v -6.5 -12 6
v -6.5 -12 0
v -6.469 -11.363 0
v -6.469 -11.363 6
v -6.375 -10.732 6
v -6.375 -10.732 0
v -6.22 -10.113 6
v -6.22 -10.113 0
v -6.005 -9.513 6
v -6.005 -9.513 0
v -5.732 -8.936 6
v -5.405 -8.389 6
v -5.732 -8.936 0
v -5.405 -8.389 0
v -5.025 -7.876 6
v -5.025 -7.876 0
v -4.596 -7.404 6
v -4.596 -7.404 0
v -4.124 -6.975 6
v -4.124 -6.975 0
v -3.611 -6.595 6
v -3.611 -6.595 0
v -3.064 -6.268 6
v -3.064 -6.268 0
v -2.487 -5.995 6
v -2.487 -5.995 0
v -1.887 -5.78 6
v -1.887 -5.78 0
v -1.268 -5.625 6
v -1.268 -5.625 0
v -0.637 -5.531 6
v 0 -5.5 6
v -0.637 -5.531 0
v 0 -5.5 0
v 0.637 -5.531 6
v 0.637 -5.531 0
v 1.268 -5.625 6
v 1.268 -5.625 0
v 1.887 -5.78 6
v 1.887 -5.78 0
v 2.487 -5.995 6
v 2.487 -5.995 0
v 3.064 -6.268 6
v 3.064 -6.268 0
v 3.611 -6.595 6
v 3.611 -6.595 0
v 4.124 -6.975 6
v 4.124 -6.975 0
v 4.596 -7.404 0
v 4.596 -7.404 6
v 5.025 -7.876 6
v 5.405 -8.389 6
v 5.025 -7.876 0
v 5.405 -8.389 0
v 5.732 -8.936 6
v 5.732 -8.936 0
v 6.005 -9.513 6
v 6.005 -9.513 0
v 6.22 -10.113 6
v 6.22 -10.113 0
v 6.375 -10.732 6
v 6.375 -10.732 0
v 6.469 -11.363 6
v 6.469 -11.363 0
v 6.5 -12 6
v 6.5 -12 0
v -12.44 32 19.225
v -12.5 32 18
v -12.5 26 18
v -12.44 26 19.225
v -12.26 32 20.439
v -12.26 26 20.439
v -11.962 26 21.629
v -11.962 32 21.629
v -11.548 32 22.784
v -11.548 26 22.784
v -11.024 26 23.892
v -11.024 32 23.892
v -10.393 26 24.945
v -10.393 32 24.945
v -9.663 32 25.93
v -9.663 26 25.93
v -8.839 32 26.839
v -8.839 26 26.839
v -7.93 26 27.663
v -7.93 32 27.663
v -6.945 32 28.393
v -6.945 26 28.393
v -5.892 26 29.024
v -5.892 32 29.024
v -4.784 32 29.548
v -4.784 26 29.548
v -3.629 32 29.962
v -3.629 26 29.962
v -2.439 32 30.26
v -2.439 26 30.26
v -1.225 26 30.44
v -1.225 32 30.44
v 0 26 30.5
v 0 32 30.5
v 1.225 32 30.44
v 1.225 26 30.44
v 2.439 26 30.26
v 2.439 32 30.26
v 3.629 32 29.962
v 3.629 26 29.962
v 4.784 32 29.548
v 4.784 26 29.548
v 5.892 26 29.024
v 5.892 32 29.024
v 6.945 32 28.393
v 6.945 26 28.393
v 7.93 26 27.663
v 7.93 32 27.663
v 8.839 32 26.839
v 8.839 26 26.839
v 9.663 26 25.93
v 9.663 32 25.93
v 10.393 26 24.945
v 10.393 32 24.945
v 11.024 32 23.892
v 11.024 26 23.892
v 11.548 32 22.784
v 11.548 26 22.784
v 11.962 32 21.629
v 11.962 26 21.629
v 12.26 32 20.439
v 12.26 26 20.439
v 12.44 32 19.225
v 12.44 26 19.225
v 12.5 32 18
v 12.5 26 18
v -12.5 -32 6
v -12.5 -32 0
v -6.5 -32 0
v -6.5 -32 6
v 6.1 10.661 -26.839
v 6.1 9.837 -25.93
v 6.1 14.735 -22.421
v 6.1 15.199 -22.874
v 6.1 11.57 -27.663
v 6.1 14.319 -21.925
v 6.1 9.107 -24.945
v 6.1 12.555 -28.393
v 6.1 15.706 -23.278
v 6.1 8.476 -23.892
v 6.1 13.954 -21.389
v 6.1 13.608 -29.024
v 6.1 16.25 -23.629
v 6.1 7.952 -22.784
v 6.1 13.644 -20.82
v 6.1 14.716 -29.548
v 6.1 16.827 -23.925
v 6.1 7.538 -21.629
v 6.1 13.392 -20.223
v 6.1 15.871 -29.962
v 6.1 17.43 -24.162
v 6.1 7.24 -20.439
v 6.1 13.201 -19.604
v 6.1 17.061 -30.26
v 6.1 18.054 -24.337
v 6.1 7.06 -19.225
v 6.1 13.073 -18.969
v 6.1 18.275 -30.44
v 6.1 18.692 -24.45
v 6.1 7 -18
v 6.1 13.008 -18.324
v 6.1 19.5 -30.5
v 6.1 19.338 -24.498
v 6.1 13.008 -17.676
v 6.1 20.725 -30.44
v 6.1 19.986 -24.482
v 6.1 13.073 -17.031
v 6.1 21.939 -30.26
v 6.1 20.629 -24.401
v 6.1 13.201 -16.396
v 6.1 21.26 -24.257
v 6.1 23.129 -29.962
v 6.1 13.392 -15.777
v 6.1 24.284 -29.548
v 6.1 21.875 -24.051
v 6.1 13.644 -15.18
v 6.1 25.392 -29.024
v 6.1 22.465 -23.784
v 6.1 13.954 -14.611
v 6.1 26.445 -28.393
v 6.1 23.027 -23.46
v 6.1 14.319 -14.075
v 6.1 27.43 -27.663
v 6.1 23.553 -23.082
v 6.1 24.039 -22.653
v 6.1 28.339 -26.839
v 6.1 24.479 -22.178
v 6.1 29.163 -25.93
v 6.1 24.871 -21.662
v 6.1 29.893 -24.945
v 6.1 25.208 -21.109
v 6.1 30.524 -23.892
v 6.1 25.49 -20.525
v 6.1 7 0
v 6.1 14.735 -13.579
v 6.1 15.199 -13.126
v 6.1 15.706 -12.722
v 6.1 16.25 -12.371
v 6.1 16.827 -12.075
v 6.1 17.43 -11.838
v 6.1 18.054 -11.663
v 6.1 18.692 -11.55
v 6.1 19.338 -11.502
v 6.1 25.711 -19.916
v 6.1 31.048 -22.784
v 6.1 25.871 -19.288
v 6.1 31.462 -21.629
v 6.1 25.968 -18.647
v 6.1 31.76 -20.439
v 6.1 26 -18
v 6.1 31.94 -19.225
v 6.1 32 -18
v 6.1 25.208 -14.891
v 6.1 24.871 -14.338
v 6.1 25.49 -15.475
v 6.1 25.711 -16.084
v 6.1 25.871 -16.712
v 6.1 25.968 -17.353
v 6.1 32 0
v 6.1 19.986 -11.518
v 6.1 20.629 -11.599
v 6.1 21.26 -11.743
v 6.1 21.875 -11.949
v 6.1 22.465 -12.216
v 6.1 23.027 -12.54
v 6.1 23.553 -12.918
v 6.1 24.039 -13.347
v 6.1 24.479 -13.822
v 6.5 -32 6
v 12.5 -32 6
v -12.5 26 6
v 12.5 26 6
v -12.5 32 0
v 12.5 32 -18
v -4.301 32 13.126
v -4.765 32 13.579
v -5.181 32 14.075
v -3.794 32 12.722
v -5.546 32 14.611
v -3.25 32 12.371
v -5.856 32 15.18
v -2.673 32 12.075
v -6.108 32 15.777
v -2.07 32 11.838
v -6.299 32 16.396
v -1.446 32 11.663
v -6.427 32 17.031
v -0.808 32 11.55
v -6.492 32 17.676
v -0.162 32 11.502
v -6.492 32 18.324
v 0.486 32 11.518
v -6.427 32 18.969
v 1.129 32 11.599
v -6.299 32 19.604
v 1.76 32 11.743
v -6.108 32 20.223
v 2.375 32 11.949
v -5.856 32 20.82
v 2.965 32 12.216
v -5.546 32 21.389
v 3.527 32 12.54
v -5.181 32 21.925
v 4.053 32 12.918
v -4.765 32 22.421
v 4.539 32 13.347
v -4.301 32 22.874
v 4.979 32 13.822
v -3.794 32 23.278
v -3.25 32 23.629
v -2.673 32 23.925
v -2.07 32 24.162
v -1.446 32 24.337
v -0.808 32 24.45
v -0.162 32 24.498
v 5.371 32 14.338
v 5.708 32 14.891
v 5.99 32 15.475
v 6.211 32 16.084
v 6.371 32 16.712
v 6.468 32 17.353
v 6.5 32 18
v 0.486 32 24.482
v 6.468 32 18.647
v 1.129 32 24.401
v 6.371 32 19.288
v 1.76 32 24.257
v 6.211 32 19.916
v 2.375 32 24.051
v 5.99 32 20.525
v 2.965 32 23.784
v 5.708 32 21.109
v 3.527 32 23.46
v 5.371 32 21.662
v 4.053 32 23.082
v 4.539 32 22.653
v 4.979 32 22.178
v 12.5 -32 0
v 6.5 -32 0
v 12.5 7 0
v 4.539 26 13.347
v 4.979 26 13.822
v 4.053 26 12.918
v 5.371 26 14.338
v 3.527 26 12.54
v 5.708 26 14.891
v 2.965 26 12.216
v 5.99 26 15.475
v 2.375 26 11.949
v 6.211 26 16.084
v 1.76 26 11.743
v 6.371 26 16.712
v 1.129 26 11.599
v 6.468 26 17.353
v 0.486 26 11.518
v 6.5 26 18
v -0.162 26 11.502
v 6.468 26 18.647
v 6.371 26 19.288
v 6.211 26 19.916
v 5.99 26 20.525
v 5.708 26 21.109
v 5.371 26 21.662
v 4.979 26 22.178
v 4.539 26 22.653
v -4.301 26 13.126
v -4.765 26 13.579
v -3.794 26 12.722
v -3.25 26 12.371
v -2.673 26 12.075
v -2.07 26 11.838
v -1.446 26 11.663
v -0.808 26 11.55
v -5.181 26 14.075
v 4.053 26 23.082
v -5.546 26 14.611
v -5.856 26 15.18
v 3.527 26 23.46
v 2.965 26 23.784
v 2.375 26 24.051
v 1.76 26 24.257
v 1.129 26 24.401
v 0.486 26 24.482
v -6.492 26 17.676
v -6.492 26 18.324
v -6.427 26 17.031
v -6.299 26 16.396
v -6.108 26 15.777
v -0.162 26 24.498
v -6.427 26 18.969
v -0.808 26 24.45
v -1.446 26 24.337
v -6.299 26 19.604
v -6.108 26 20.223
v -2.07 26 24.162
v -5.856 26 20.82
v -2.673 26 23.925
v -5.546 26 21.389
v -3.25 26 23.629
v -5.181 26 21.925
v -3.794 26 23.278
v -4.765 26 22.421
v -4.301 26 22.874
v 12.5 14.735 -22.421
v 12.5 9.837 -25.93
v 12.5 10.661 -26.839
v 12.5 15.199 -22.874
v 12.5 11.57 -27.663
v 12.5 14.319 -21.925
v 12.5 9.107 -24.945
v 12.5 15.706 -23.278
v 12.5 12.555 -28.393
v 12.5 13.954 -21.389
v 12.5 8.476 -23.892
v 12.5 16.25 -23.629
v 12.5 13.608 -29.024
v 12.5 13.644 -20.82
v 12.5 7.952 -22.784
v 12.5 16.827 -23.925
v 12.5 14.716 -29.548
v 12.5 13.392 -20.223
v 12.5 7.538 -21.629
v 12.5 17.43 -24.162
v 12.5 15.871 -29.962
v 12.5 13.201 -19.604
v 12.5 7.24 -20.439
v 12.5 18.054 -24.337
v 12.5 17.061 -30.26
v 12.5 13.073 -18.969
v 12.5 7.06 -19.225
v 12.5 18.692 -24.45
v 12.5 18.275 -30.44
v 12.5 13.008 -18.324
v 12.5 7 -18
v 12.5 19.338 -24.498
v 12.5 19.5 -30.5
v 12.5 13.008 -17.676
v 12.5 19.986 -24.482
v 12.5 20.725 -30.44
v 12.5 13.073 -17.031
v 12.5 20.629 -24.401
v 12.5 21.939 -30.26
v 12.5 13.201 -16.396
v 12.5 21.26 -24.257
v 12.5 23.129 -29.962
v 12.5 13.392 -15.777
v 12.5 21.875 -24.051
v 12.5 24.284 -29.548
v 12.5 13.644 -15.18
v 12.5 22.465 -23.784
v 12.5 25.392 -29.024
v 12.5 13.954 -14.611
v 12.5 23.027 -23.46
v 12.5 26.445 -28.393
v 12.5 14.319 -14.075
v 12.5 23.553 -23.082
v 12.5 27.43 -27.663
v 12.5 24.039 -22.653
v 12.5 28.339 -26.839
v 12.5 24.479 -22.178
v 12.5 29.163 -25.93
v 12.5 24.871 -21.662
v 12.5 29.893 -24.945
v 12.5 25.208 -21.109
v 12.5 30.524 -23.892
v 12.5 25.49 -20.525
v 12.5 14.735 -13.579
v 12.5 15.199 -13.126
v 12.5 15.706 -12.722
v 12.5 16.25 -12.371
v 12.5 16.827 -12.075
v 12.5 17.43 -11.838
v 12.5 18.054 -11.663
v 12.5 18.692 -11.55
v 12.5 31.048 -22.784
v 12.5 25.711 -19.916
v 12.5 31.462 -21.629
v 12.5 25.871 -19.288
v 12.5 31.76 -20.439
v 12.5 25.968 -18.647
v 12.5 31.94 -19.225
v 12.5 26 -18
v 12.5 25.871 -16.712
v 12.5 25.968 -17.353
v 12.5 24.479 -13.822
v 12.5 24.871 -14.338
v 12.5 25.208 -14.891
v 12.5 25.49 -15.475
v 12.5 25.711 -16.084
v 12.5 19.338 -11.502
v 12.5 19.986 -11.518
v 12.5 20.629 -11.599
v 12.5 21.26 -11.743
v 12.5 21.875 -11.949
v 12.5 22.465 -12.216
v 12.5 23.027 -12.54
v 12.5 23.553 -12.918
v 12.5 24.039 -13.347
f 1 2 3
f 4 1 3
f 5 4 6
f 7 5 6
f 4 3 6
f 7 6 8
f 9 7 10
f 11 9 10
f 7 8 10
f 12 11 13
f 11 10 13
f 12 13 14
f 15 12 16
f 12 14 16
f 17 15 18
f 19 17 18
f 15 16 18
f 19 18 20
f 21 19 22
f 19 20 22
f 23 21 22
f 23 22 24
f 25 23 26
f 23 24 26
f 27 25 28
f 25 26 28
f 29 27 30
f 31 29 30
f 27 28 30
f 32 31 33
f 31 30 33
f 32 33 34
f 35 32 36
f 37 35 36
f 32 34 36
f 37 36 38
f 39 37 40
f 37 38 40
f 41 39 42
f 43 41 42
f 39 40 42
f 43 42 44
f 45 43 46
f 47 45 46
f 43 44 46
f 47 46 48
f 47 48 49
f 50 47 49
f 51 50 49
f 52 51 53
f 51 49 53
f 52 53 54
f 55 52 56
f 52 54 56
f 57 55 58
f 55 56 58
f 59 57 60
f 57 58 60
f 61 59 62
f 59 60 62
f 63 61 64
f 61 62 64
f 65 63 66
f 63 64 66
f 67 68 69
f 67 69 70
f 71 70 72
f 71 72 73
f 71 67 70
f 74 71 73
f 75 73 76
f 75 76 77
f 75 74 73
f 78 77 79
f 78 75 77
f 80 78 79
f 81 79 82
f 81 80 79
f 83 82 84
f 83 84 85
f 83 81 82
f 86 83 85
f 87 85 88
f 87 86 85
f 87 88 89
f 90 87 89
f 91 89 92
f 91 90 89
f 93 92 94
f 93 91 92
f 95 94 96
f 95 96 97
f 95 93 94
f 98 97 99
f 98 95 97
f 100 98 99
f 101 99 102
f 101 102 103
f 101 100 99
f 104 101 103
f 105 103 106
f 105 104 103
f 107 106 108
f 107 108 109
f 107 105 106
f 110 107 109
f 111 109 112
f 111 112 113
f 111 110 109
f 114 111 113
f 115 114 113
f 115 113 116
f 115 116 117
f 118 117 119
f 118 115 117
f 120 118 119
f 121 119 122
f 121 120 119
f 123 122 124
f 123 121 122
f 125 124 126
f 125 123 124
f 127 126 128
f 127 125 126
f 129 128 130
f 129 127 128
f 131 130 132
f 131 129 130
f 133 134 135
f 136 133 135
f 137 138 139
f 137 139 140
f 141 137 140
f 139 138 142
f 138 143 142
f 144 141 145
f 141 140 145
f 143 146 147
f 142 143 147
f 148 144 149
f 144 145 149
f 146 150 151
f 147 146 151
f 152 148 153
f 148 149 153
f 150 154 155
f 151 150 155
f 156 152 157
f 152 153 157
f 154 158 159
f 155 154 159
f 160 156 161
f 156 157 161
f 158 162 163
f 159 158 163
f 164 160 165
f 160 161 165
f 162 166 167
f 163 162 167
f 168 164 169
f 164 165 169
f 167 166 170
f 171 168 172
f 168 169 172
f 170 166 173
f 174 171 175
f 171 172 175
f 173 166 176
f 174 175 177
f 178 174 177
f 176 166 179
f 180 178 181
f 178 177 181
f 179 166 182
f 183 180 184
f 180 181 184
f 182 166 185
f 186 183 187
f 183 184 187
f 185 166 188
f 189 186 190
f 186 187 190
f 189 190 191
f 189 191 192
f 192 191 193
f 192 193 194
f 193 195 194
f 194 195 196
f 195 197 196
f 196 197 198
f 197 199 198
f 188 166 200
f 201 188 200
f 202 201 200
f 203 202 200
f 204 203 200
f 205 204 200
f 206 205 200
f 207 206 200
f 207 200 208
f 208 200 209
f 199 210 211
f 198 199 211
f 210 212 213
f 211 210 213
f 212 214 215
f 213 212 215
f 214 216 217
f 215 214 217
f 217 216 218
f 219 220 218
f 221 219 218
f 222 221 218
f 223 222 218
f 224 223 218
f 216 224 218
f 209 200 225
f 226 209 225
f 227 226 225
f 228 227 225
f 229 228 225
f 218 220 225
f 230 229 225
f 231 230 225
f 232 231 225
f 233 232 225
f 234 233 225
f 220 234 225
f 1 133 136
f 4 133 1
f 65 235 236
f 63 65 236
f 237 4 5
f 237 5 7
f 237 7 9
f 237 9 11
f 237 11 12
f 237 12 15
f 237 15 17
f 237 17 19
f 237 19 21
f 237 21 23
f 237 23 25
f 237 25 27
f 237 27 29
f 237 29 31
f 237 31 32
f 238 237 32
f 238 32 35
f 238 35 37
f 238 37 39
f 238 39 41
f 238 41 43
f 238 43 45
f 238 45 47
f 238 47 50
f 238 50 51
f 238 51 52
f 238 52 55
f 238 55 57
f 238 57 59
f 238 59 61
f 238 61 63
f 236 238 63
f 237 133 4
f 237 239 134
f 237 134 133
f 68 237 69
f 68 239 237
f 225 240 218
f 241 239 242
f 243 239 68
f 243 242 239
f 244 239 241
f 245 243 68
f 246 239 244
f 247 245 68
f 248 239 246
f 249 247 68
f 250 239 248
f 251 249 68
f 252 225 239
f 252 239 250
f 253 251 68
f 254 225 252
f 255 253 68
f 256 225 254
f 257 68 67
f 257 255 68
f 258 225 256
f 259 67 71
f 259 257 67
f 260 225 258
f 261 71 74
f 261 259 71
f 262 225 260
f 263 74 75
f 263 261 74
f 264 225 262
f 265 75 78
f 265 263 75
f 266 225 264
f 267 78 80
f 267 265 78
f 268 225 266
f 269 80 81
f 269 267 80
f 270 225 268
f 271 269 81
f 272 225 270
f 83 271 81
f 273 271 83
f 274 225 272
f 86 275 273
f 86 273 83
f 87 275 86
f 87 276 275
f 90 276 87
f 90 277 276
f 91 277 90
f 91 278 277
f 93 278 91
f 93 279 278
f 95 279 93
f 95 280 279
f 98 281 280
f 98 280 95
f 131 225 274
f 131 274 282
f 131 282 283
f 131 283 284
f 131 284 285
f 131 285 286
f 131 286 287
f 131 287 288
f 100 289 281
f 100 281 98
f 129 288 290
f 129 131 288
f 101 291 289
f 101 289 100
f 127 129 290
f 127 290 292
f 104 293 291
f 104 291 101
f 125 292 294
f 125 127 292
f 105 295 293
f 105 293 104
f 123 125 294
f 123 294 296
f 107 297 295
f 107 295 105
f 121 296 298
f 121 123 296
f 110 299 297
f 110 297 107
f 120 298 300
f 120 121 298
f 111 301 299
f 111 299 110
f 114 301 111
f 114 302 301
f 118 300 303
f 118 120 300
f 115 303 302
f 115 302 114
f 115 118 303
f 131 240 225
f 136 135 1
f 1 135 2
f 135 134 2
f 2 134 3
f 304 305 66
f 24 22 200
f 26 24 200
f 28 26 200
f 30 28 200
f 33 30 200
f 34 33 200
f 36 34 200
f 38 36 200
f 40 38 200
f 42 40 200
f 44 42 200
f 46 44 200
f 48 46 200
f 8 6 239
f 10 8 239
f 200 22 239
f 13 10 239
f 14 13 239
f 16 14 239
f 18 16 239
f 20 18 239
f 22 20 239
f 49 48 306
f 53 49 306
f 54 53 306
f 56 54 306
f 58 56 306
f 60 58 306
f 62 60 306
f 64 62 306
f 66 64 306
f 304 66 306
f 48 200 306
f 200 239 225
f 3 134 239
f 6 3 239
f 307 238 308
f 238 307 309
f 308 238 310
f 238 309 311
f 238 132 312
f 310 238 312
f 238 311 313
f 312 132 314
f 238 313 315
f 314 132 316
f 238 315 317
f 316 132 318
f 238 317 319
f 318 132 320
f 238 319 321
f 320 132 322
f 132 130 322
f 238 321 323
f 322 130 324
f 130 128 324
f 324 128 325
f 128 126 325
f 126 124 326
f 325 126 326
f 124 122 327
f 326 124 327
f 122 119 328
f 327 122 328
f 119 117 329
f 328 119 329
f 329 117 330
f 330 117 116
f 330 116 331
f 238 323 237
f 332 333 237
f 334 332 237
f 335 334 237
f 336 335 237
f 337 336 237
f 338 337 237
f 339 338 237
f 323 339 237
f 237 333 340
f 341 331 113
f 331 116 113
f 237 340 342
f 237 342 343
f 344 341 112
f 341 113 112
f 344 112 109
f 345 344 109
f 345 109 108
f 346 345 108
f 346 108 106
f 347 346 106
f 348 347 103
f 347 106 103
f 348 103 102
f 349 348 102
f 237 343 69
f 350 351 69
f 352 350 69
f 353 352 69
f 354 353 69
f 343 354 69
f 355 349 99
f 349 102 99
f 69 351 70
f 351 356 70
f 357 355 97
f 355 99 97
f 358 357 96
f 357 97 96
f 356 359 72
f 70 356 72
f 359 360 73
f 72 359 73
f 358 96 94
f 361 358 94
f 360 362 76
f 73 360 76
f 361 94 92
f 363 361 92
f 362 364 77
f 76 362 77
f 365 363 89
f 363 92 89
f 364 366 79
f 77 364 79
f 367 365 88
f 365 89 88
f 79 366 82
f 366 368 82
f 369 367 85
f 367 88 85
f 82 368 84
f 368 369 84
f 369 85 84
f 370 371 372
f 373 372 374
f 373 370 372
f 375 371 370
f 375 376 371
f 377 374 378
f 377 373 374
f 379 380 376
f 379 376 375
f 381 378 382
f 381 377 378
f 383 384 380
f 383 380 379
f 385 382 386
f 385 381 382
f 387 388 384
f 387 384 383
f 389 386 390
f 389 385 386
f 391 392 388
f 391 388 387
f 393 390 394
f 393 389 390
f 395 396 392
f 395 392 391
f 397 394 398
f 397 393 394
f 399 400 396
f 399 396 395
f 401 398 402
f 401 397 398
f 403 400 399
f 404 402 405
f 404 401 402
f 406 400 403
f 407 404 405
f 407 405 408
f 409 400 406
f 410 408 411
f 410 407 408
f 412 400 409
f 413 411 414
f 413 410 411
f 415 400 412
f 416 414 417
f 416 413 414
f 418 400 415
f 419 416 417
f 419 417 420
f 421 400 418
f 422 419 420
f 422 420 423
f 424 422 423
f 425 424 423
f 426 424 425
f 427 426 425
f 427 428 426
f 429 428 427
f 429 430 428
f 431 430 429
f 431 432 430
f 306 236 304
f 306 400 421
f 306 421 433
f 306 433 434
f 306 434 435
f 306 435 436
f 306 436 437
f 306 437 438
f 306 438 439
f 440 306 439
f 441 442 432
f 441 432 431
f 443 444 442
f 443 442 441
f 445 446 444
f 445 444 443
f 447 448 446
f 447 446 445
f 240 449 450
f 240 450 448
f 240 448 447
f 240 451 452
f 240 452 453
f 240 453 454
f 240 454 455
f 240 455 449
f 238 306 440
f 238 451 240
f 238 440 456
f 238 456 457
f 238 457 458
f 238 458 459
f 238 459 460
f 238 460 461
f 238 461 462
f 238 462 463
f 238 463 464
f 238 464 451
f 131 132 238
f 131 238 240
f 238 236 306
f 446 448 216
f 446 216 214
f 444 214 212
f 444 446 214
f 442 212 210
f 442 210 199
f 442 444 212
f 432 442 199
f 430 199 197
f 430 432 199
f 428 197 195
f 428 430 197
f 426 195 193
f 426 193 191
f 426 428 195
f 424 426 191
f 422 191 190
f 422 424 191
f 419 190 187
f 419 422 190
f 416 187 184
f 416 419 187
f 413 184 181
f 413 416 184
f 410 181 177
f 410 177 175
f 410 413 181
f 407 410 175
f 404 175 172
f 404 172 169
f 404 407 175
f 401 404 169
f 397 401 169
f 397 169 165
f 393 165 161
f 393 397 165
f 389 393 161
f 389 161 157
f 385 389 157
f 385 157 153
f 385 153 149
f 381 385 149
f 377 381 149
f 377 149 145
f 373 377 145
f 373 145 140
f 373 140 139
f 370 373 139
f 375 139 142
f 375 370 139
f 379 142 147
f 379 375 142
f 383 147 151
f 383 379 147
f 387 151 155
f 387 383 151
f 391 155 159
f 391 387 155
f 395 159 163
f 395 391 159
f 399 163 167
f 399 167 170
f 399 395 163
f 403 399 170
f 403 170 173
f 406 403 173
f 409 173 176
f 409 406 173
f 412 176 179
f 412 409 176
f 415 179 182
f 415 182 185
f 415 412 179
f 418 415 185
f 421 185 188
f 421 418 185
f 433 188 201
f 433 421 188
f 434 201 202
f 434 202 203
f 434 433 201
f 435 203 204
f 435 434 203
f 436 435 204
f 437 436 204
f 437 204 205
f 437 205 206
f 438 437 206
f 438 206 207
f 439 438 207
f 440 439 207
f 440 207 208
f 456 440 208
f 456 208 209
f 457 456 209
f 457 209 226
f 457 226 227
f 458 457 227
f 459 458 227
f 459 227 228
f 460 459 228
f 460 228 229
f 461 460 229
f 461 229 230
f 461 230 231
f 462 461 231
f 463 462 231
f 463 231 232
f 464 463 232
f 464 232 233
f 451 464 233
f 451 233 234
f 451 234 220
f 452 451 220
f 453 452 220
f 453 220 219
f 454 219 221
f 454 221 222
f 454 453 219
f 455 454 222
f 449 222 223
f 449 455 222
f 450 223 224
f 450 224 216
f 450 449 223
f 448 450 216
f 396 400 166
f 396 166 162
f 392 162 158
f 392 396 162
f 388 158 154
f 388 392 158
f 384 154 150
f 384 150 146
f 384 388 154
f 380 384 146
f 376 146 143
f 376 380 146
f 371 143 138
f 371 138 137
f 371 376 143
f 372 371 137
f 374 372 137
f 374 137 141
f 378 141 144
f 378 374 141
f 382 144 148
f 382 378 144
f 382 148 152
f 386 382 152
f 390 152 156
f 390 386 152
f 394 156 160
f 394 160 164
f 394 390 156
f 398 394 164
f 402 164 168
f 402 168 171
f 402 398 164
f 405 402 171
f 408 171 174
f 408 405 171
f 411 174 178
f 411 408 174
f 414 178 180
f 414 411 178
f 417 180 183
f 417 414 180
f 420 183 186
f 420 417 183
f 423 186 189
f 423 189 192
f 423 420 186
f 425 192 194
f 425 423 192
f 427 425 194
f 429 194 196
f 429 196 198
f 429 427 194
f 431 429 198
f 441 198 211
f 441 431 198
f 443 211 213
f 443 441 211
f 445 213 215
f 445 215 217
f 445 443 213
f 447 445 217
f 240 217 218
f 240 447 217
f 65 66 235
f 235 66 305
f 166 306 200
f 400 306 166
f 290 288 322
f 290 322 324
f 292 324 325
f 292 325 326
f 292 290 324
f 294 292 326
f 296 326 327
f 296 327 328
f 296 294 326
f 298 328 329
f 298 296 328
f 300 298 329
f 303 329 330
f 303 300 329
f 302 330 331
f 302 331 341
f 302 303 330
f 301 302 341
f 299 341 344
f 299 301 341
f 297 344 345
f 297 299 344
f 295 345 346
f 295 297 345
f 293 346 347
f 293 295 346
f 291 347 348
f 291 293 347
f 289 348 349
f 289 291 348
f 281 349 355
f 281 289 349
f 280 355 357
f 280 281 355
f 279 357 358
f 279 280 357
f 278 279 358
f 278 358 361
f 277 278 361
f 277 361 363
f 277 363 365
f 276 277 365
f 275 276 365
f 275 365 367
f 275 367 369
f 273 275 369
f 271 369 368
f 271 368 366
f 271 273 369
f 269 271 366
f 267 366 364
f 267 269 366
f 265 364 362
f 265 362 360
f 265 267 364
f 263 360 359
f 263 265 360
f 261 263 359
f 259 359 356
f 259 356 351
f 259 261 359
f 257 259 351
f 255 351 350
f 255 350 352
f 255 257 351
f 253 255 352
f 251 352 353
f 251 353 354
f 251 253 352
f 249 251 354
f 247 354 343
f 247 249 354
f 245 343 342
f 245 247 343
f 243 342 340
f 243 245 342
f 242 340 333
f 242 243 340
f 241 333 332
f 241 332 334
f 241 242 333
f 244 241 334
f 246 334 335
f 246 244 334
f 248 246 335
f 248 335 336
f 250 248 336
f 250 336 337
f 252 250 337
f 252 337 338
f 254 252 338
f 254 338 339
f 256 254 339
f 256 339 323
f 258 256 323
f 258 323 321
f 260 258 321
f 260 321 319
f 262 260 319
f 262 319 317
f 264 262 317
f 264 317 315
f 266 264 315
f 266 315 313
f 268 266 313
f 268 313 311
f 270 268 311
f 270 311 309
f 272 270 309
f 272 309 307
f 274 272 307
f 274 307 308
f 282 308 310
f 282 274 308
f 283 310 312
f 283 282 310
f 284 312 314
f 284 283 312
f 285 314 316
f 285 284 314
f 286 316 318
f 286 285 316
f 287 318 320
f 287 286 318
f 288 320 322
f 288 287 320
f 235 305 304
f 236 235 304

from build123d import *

# Parameters (mm, degrees)
F1_DEPTH = 6
F3_DEPTH = 6
F5_DEPTH = 6.4


with BuildPart() as f1:
    # F0 (on Top) → F1 (new body)
    with BuildSketch(Plane.XY):
        with BuildLine():
            Line((12.5, -32), (12.5, 32))
            Line((12.5, 32), (-12.5, 32))
            Line((-12.5, 32), (-12.5, -32))
            Line((-12.5, -32), (-6.5, -32))
            Line((-6.5, -32), (-6.5, -12))
            ThreePointArc((-6.5, -12), (0, -5.5), (6.5, -12))
            Line((6.5, -12), (6.5, -32))
            Line((6.5, -32), (12.5, -32))
        make_face()
    extrude(amount=F1_DEPTH)

    # F2 (on face) → F3 (join)
    with BuildSketch(Plane(origin=(0, 32, 0), x_dir=(-1, 0, 0), z_dir=(0, 1, 0))):
        with BuildLine():
            Line((-12.5, 18), (-12.5, 6))
            Line((-12.5, 6), (12.5, 6))
            Line((12.5, 6), (12.5, 18))
            Line((12.5, 18), (6.5, 18))
            ThreePointArc((6.5, 18), (0, 11.5), (-6.5, 18))
            Line((-6.5, 18), (-12.5, 18))
        make_face()
        with BuildLine():
            ThreePointArc((12.5, 18), (0, 30.5), (-12.5, 18))
            Line((-12.5, 18), (-6.5, 18))
            ThreePointArc((-6.5, 18), (0, 24.5), (6.5, 18))
            Line((6.5, 18), (12.5, 18))
        make_face()
    extrude(amount=-F3_DEPTH)

    # F4 (on face) → F5 (join)
    with BuildSketch(Plane.YZ.offset(12.5)):
        with BuildLine():
            Line((32, -18), (32, 0))
            Line((32, 0), (7, 0))
            Line((7, 0), (7, -18))
            Line((7, -18), (13, -18))
            ThreePointArc((13, -18), (19.5, -11.5), (26, -18))
            Line((26, -18), (32, -18))
        make_face()
        with BuildLine():
            ThreePointArc((7, -18), (19.5, -30.5), (32, -18))
            Line((32, -18), (26, -18))
            ThreePointArc((26, -18), (19.5, -24.5), (13, -18))
            Line((13, -18), (7, -18))
        make_face()
    extrude(amount=-F5_DEPTH)


solid = f1.part
